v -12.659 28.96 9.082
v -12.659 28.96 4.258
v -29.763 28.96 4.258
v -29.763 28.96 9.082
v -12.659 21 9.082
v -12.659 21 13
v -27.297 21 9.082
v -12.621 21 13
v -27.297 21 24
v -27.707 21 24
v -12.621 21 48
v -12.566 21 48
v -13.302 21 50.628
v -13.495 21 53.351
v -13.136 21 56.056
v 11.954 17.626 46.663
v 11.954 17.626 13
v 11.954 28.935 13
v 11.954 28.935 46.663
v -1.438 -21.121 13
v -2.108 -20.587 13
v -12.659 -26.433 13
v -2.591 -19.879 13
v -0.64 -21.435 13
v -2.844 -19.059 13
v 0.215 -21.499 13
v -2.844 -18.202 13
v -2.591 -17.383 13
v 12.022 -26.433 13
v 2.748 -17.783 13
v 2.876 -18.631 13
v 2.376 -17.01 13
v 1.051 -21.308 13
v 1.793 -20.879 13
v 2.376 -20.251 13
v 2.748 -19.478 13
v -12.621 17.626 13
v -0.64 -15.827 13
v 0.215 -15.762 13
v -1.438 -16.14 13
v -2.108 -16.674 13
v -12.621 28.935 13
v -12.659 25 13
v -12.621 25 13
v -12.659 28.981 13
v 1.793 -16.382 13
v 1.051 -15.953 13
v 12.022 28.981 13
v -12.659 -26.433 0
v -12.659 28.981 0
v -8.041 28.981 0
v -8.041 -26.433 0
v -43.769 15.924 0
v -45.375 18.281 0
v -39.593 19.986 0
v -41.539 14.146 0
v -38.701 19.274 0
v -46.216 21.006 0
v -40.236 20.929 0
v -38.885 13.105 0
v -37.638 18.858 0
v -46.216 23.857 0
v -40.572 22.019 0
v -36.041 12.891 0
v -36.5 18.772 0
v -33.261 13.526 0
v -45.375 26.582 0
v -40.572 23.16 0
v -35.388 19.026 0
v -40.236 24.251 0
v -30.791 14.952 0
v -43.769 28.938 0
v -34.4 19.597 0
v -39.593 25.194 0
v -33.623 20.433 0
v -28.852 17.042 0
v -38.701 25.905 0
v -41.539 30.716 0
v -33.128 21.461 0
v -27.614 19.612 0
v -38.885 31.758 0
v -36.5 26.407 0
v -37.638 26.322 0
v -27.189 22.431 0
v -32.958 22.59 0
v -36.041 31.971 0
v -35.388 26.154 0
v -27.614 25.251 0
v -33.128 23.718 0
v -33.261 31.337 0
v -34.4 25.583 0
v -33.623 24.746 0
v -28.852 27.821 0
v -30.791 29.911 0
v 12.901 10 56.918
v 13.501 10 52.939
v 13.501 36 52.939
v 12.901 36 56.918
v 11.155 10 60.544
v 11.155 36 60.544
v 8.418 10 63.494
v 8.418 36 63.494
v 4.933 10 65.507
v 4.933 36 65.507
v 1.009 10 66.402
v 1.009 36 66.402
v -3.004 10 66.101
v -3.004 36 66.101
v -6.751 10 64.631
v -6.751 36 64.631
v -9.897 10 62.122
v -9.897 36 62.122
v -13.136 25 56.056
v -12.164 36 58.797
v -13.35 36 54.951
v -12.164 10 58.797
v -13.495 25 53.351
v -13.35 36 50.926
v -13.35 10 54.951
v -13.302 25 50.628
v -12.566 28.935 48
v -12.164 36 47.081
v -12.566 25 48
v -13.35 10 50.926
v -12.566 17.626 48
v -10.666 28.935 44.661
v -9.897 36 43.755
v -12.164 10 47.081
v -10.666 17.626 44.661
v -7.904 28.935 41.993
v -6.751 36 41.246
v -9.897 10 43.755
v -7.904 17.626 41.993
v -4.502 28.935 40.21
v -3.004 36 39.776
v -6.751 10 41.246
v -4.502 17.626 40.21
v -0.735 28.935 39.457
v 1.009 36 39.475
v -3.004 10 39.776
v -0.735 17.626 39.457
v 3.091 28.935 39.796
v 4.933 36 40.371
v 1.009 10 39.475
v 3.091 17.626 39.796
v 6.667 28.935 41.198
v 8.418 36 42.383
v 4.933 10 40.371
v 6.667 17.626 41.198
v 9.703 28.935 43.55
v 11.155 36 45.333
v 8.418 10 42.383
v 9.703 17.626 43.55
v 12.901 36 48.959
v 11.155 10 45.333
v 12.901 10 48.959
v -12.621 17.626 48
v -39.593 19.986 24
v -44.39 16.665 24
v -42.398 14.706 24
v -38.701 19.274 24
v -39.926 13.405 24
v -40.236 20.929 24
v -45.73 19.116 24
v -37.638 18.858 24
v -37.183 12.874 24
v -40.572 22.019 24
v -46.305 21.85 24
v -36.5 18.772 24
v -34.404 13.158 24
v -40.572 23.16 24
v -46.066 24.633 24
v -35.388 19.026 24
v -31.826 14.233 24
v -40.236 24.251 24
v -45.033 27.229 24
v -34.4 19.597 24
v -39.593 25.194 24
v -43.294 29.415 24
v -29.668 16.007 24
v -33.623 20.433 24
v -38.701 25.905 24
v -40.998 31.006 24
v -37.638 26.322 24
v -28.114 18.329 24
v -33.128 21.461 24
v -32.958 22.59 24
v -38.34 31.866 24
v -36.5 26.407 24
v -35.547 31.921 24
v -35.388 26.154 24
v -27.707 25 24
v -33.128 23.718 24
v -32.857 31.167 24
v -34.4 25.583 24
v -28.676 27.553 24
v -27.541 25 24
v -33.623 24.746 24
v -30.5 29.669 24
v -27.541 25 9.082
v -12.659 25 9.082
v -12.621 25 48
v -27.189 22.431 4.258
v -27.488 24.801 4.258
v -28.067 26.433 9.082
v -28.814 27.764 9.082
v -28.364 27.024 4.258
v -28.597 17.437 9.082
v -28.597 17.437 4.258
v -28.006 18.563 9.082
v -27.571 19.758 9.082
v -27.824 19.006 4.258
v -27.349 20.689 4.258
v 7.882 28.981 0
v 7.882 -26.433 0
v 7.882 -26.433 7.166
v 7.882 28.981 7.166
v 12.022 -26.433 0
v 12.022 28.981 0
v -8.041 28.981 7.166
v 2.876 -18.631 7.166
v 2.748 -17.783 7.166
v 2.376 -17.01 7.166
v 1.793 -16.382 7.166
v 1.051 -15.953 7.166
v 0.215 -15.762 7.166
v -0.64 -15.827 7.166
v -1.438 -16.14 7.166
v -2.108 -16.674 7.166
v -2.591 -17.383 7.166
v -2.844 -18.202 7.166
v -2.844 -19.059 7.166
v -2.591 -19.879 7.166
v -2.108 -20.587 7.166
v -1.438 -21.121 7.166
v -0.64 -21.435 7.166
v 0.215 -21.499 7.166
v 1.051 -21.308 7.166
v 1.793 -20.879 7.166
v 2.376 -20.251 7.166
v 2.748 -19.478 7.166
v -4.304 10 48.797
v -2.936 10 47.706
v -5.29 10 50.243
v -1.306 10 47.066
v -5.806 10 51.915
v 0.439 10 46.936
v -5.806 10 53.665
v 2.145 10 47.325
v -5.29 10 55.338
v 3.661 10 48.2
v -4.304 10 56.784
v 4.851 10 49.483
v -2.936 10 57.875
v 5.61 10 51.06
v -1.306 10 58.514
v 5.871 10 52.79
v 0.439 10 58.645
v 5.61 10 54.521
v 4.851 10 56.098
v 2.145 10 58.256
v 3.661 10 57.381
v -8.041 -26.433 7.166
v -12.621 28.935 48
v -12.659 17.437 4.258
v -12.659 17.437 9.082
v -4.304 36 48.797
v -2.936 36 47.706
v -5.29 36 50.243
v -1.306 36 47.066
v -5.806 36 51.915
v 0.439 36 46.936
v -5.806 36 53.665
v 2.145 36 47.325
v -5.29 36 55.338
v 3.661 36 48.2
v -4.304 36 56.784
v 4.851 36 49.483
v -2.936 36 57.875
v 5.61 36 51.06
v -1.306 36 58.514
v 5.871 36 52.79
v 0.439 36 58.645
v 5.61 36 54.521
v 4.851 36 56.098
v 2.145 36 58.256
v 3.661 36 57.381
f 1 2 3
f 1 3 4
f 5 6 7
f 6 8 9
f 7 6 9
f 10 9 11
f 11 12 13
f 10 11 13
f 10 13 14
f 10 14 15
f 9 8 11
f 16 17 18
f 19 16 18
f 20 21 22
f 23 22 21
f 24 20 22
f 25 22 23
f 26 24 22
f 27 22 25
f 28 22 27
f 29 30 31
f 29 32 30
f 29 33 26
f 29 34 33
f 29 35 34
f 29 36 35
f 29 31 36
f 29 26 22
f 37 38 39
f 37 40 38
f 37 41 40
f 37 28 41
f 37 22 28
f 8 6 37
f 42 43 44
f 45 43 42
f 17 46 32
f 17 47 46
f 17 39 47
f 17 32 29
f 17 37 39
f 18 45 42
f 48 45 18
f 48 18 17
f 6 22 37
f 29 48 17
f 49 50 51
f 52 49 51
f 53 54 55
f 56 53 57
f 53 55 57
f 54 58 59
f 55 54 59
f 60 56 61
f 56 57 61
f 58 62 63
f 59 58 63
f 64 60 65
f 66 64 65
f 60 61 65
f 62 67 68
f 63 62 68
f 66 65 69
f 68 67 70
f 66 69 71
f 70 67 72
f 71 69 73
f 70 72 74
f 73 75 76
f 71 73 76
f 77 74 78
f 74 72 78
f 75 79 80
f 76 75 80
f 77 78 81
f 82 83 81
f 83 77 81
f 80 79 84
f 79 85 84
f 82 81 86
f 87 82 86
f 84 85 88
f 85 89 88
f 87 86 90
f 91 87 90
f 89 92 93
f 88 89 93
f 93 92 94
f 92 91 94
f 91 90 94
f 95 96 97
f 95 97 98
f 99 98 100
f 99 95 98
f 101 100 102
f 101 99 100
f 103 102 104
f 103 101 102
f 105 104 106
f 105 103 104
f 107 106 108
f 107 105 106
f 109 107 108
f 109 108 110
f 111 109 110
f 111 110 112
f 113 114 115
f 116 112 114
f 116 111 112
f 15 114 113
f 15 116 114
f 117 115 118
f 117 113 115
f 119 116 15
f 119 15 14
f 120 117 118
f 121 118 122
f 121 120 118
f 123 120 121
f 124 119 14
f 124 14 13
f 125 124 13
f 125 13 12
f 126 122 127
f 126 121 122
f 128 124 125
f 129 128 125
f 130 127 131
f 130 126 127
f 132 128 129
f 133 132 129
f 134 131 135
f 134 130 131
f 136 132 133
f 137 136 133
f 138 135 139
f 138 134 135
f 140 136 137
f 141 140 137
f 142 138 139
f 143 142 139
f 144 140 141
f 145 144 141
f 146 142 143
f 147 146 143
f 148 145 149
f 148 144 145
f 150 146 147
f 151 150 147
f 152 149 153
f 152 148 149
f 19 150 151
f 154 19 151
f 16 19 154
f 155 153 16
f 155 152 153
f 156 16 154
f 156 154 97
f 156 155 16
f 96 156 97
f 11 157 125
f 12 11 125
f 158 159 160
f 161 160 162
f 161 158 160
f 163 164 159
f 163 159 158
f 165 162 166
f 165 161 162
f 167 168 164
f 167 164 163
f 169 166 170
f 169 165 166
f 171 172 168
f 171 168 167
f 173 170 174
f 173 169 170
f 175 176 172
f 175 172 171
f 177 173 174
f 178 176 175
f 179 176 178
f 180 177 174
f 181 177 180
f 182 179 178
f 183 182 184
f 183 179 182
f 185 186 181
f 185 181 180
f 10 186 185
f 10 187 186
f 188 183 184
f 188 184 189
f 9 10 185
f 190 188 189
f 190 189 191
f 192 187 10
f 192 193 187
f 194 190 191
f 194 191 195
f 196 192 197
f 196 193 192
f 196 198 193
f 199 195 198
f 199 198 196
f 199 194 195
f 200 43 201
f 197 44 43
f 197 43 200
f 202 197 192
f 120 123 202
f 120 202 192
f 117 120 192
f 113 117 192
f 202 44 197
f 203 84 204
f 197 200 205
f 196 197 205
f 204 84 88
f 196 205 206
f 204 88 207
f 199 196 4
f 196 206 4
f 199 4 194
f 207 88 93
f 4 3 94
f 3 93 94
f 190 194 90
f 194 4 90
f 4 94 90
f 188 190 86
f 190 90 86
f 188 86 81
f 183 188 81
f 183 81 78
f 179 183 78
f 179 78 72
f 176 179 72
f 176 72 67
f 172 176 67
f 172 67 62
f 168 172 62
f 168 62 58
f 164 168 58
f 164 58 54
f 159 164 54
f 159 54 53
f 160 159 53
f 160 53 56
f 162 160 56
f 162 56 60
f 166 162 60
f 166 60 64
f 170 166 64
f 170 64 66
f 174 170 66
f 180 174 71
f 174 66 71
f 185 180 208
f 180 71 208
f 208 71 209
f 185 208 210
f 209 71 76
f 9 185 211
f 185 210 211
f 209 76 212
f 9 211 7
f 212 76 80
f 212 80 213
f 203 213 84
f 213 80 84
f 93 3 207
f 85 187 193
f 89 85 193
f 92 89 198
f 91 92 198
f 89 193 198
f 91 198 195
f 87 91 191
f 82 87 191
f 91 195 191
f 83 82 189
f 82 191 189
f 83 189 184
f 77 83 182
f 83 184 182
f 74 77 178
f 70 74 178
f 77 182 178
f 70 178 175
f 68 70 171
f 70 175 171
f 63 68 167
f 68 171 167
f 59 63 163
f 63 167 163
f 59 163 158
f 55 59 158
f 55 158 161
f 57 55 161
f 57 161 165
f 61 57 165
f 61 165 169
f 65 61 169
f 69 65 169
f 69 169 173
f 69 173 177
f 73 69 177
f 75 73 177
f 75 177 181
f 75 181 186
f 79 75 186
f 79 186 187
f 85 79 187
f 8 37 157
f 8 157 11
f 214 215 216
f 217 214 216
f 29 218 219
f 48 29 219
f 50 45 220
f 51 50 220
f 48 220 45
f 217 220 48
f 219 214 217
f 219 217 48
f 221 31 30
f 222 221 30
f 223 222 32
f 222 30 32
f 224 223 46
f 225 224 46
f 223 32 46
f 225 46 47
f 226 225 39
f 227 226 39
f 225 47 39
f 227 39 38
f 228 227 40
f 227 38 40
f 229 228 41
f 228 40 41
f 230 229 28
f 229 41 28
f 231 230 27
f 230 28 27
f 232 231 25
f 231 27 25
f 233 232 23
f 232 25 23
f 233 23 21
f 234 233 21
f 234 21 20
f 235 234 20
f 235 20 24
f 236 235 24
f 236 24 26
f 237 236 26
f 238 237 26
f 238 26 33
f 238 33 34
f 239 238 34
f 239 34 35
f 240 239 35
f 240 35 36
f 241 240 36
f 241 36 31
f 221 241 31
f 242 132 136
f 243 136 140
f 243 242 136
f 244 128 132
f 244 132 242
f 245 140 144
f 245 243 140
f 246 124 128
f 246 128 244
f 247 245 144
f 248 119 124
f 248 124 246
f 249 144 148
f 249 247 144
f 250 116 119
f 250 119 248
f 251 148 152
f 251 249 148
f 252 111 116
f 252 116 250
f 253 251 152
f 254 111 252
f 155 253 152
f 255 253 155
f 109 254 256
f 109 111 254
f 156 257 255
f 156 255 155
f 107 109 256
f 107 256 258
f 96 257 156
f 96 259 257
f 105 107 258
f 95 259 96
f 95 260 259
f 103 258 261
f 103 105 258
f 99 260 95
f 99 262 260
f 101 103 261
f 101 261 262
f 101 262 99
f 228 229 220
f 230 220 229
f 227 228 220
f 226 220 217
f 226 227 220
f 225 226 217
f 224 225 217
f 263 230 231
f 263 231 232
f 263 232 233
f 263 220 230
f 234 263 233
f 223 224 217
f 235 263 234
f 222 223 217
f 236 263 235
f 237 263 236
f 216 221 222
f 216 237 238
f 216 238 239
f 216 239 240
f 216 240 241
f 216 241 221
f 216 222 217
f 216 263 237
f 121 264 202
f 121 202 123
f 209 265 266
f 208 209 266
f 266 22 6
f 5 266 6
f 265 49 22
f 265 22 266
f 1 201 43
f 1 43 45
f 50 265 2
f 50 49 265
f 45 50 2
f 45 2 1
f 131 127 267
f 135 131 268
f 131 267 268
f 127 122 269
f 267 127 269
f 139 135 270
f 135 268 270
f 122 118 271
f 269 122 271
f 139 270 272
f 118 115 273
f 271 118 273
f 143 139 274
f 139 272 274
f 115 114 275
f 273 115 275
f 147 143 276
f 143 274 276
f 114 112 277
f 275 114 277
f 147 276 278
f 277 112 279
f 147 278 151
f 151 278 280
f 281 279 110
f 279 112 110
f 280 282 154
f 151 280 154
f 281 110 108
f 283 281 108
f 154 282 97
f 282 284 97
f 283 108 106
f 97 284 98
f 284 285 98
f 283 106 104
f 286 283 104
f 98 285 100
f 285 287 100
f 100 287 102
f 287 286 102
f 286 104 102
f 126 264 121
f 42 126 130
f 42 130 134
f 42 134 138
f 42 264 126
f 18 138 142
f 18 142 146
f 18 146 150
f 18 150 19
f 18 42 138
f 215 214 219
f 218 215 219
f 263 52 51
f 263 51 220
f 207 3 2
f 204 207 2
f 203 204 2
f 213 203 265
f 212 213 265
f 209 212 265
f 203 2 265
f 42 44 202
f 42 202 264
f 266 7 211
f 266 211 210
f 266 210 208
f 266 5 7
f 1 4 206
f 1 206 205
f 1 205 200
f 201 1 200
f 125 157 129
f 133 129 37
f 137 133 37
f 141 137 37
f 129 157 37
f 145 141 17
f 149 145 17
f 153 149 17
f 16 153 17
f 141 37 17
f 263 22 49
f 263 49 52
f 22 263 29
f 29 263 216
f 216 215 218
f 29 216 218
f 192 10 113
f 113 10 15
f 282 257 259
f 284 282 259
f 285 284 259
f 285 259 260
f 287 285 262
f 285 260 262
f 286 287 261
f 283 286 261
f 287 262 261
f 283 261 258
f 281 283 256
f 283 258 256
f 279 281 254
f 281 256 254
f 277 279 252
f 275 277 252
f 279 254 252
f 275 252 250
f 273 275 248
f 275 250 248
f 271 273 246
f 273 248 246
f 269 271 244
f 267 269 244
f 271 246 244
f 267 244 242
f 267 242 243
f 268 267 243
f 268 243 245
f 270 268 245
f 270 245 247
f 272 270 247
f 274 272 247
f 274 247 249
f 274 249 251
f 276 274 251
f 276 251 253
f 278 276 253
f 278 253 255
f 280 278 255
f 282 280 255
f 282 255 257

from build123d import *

# Parameters (mm, degrees)
SKETCH_W        = 24.681526
SKETCH_H        = 55.414013
PAD_DEPTH       = 13
SKETCH001_W     = 15.923566
SKETCH001_H     = 11.305732
POCKET_DEPTH    = 55.415013
SKETCH002_R     = 2.87618
POCKET001_DEPTH = 13.001
SKETCH003_W     = 24.574786
SKETCH003_H     = 11.309867
PAD001_DEPTH    = 35
SKETCH004_W     = 11.522993
SKETCH004_H     = 4.823732
PAD002_DEPTH    = 22
PAD003_DEPTH    = 2
SKETCH006_R     = 9.566685
PAD004_DEPTH    = 24
SKETCH007_R     = 3.828287
POCKET002_DEPTH = 24.001
SKETCH008_R     = 13.5012954455
PAD005_DEPTH    = 13
SKETCH009_R     = 5.871137
POCKET003_DEPTH = 26.001


with BuildPart() as part:
    # Sketch → Pad (new body)
    with BuildSketch(Plane.XY):
        with Locations((-0.318477, 1.2738855)):
            Rectangle(SKETCH_W, SKETCH_H)
    extrude(amount=PAD_DEPTH)

    # Sketch001 (on Face3 of Pad) → Pocket (cut, through all)
    with BuildSketch(Plane.XZ.offset(26.433121)):
        with Locations((-0.079613, 1.512745)):
            Rectangle(SKETCH001_W, SKETCH001_H)
    extrude(amount=-POCKET_DEPTH, mode=Mode.SUBTRACT)

    # Sketch002 (on Face8 of Pocket) → Pocket001 (cut, through all)
    with BuildSketch(Plane.XY.offset(13)):
        with Locations((0, -18.630573)):
            Circle(SKETCH002_R)
    extrude(amount=-POCKET001_DEPTH, mode=Mode.SUBTRACT)

    # Sketch003 (on Face8 of Pocket001) → Pad001 (join)
    with BuildSketch(Plane.XY.offset(13)):
        with Locations((-0.333364, 23.2805385)):
            Rectangle(SKETCH003_W, SKETCH003_H)
    extrude(amount=PAD001_DEPTH)

    # Sketch004 (on Face9 of Pad001) → Pad002 (join)
    with BuildSketch(Plane(origin=(-12.65924, 0, 0), x_dir=(0, -1, 0), z_dir=(-1, 0, 0))):
        with Locations((-23.1981075, 6.669861)):
            Rectangle(SKETCH004_W, SKETCH004_H)
    extrude(amount=PAD002_DEPTH)

    # Sketch005 → Pad003 (join, symmetric)
    with BuildSketch(Plane.XZ.offset(-23)):
        Polygon((-34.666348, 8.690443), (-12.38179, 57.716461), (-12.38179, 8.690443), align=None)
    extrude(amount=PAD003_DEPTH, both=True)

    # Sketch006 → Pad004 (join)
    with BuildSketch(Plane.XY):
        with Locations((-36.756073, 22.431417)):
            Circle(SKETCH006_R)
    extrude(amount=PAD004_DEPTH)

    # Sketch007 (on Face27 of Pad004) → Pocket002 (cut, through all)
    with BuildSketch(Plane.XY.offset(24)):
        with Locations((-36.786556, 22.589872)):
            Circle(SKETCH007_R)
    extrude(amount=-POCKET002_DEPTH, mode=Mode.SUBTRACT)

    # Sketch008 → Pad005 (join, symmetric)
    with BuildSketch(Plane.XZ.offset(-23)):
        with Locations((0, 52.938587)):
            Circle(SKETCH008_R)
    extrude(amount=PAD005_DEPTH, both=True)

    # Sketch009 (on Face31 of Pad005) → Pocket003 (cut, through all)
    with BuildSketch(Plane.XZ.offset(-10)):
        with Locations((0, 52.790291)):
            Circle(SKETCH009_R)
    extrude(amount=-POCKET003_DEPTH, mode=Mode.SUBTRACT)


solid = part.part
